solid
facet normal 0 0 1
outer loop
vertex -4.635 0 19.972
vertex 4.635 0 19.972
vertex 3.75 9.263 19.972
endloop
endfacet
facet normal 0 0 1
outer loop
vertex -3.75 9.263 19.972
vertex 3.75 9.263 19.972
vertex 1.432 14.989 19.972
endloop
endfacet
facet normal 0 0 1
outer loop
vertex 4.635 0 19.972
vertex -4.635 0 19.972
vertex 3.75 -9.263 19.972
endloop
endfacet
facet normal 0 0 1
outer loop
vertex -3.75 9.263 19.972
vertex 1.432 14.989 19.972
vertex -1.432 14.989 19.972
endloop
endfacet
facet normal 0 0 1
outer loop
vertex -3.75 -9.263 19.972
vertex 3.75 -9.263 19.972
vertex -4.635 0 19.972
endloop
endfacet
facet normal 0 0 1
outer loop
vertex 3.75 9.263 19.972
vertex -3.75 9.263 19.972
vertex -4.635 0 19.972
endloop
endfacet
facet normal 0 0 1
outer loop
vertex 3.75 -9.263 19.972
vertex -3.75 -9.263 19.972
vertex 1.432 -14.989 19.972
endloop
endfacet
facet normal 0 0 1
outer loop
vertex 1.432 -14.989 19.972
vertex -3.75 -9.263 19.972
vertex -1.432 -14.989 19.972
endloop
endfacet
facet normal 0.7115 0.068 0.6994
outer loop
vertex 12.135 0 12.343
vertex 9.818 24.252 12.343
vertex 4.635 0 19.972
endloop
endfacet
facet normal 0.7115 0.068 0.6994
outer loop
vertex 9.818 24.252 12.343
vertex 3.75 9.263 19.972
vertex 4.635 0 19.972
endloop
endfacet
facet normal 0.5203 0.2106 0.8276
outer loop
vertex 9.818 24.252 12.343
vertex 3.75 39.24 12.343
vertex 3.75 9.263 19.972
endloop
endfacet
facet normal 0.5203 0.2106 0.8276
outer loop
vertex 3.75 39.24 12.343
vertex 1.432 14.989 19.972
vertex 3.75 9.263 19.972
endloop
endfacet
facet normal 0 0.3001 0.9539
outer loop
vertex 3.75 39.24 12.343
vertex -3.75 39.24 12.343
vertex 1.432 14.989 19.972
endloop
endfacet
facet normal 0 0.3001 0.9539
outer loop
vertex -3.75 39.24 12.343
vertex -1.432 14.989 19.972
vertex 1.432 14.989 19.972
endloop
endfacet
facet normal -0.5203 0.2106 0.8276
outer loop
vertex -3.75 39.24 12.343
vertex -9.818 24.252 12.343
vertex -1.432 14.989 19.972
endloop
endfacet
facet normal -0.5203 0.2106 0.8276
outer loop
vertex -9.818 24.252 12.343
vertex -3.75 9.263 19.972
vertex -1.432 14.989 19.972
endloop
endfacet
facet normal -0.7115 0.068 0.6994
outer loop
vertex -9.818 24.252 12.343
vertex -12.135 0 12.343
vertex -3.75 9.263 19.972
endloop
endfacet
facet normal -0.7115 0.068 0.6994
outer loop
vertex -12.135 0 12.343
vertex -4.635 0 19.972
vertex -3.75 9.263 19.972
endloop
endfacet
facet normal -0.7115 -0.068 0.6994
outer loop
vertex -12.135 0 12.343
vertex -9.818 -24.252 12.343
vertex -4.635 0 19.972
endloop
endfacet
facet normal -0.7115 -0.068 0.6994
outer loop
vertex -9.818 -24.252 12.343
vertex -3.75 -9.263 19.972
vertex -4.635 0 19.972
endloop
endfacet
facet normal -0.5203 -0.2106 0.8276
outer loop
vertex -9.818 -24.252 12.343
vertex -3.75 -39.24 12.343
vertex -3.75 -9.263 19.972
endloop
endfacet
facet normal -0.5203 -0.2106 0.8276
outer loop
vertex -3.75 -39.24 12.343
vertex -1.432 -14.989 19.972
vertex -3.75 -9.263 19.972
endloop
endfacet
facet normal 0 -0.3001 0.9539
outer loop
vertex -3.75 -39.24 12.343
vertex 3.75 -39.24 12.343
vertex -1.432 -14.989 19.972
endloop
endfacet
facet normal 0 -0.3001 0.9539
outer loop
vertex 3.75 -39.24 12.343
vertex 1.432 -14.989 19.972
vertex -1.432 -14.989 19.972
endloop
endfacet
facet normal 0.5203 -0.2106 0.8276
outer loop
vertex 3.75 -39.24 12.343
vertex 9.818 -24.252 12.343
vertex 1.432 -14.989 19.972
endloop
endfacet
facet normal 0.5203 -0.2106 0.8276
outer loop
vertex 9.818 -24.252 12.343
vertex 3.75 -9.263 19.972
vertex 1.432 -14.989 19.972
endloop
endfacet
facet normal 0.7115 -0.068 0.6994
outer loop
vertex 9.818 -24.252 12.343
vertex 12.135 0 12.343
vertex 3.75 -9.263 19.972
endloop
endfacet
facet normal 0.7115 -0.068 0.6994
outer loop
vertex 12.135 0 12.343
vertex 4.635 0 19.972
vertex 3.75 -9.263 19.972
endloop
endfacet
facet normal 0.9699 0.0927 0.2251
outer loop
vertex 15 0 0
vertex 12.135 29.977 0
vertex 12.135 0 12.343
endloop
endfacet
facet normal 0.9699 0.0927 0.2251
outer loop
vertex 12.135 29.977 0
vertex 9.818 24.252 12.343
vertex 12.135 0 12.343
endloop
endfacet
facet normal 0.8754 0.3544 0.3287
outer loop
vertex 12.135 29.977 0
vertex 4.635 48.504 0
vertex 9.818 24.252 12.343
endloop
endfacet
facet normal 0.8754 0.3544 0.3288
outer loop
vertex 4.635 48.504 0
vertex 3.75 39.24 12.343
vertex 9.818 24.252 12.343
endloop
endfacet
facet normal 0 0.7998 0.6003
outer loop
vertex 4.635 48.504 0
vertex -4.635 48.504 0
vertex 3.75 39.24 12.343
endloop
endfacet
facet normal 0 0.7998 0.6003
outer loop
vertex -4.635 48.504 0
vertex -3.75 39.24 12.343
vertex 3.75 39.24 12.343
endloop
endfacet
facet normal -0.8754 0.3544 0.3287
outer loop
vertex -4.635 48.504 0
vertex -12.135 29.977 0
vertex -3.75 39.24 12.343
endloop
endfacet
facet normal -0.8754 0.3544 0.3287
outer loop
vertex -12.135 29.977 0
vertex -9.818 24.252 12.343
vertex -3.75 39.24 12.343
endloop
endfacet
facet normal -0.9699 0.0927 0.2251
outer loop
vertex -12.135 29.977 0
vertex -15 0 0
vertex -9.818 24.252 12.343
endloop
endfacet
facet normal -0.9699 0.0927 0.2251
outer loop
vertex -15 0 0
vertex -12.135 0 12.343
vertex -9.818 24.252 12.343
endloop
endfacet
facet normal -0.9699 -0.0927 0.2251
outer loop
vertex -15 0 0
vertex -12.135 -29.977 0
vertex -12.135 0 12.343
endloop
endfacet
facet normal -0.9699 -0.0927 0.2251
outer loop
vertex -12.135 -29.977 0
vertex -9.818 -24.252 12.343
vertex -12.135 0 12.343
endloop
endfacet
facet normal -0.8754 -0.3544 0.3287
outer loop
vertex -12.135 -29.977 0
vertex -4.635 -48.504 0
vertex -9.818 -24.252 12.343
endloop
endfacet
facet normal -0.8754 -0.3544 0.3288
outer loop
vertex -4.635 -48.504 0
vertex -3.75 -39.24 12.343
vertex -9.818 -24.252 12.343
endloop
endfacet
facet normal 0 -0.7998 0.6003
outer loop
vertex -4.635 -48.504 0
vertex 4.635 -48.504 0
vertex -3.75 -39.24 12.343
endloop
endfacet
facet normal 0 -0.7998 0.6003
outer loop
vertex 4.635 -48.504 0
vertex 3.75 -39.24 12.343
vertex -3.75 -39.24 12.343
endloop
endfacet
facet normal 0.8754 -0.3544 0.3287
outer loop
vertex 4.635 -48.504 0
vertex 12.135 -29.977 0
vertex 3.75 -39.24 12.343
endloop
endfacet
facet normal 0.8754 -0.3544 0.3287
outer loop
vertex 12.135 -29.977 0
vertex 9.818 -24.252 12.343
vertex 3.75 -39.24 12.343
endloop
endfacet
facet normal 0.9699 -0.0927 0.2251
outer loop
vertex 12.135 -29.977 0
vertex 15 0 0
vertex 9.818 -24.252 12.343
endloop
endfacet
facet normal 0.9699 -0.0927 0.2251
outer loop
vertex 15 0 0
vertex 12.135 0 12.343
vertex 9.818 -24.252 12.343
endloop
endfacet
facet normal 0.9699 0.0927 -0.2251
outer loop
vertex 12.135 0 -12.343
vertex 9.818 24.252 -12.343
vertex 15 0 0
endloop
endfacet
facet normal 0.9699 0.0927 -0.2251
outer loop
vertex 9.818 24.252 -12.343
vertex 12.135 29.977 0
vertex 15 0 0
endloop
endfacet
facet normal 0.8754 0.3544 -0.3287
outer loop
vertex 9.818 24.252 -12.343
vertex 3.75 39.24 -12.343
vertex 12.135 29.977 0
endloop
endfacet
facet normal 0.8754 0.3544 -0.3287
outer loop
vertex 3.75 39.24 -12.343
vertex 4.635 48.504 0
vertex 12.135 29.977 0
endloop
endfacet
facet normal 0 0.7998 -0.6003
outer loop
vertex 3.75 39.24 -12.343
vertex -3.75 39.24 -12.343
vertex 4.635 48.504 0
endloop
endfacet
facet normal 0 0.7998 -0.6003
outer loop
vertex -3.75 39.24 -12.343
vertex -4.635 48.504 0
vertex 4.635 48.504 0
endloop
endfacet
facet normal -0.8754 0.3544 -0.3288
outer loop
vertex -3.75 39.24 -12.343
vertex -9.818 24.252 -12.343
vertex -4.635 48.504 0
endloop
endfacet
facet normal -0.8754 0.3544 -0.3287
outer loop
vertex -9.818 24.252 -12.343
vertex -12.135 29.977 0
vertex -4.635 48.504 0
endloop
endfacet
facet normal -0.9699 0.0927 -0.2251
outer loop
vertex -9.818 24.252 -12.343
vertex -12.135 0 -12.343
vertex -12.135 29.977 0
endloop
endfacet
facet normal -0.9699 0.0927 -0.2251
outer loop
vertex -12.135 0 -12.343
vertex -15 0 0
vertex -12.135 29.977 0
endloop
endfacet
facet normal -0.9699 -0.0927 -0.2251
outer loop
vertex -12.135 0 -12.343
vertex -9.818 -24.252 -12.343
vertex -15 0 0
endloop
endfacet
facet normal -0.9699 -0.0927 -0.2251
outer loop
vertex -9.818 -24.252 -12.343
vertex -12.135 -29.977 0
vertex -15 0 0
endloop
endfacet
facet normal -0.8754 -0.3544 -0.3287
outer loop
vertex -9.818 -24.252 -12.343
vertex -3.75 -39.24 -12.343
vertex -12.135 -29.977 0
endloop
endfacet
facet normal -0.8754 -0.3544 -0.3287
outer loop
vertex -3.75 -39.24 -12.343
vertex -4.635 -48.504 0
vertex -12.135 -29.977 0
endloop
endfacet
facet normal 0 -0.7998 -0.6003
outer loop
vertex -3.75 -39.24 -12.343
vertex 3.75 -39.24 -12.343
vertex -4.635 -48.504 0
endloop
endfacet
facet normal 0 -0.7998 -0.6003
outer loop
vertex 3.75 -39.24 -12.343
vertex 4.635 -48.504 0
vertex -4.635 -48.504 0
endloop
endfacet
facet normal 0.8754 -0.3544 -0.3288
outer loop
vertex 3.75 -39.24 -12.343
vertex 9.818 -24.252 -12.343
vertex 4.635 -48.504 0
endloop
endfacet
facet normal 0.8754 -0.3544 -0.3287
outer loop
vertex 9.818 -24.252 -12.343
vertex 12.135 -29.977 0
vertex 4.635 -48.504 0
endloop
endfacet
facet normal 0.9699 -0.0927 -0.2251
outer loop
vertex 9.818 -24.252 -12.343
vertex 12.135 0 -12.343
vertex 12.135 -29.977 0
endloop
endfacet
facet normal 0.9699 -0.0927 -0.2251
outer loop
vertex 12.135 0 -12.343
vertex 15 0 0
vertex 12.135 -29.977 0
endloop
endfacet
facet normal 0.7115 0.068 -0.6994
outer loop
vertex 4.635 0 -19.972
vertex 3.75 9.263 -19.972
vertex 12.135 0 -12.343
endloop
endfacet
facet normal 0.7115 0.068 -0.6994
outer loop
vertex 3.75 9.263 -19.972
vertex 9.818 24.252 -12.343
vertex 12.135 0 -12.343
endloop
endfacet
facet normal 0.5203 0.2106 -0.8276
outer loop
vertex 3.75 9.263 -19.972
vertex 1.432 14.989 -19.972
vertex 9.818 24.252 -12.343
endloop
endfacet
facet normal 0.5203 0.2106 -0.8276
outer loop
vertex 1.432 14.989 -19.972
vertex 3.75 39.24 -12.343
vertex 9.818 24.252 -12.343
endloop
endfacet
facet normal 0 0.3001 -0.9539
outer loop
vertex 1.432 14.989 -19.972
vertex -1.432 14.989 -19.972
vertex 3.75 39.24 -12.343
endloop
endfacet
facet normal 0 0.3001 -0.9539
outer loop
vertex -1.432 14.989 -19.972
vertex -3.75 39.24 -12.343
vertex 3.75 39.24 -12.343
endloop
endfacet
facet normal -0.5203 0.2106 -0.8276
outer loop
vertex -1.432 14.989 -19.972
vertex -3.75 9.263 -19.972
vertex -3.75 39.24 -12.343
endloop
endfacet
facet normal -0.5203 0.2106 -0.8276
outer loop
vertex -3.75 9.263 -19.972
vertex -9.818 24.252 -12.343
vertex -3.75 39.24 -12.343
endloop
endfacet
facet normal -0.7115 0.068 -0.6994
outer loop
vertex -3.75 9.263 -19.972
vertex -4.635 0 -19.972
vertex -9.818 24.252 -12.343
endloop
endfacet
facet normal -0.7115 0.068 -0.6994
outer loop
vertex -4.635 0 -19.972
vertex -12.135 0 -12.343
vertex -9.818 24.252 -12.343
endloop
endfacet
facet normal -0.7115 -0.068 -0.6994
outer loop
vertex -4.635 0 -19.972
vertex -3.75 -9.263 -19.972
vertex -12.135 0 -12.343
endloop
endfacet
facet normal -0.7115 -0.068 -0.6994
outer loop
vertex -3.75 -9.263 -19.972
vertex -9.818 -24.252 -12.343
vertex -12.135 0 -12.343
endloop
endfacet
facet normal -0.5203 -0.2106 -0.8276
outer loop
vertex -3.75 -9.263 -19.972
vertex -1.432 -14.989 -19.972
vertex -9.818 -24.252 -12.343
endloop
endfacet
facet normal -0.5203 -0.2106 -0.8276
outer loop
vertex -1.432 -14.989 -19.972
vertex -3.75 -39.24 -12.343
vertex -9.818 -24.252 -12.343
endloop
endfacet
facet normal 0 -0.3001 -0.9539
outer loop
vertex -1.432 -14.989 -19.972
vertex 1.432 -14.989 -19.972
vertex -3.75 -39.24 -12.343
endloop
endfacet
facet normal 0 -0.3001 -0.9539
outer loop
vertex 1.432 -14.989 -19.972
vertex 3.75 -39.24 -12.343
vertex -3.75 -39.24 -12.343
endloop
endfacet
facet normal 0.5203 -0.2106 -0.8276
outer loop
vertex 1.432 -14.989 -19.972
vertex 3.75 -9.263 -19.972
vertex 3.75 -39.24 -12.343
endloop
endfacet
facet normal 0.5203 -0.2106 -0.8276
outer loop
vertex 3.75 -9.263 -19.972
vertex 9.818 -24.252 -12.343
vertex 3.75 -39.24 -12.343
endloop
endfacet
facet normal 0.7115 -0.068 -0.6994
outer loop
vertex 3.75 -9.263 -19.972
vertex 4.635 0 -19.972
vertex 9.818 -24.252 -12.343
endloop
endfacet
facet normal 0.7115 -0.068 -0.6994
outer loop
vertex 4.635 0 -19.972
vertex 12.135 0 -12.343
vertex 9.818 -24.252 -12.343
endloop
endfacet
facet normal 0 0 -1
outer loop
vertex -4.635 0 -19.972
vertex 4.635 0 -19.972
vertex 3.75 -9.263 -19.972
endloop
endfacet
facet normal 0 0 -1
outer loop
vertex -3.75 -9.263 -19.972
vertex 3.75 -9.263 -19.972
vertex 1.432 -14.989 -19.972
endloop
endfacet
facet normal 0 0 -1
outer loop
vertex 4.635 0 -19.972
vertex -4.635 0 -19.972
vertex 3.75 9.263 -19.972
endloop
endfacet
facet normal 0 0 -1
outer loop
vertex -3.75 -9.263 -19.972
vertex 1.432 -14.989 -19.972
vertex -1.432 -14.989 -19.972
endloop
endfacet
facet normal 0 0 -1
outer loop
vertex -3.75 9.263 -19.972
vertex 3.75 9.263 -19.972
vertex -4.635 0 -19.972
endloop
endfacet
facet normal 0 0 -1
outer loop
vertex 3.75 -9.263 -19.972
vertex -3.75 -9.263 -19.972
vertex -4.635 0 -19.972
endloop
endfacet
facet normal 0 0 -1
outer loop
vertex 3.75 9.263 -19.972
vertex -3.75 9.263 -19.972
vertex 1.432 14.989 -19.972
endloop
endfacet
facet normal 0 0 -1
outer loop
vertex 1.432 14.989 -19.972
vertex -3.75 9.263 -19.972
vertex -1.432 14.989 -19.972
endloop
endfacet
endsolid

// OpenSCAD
// Generated by SolidPython 1.0.1 on 2020-07-29 00:46:46


scale(v = [5, 17, 7]) {
	sphere(r = 3);
}
/***********************************************
*********      SolidPython code:      **********
************************************************
 
# import packages: SolidPython
from solid import *
from solid.utils import *
from itertools import chain, combinations, permutations


class Resize:

    def __init__(self, scad_file):
        self.scad_file = scad_file
        #self.scad_file = import_scad(scad_file)
        # cone/cylinder param:
        self.r1 = 0
        self.r2 = 0
        self.h = 0
        # rectangular prism param:
        self.w = 0
        self.l = 0
        # ellipse param:
        self.r = 0

    # import OpenScad code (file name corresponds to shape)


    # classify shape + parameters
    def assign(self, param1, param2, param3):
        if self.scad_file == 'cone.scad':
            self.r1 = param1
            self.r2 = param2
            self.h = param3
        elif self.scad_file == 'cylinder.scad':
            self.r1 = param1
            self.r2 = param2
            self.h = param3
        elif self.scad_file == 'rectangularPrism.scad':
            self.h = param1
            self.l = param2
            self.w = param3
        else:
            self.r = param1
            self.h = param2

    # resize parameters
    def iterate(self):
        x = range(3, 20, 2)
        i = 1
        if self.scad_file == 'cone.scad':
            tempList = list(permutations(x, 2))
            for temp in tempList:
                param1 = temp[0]
                param2 = temp[1]
                filepath = 'produced_scad_files/' + 'cone' + str(param1) + '_' + str(param2) + '_' + '.scad'
                scad_render_to_file(cylinder(h=param1, r1=param2, r2=0), filepath)

        elif self.scad_file == 'cylinder.scad':
            tempList = list(permutations(x, 3))
            for temp in tempList:
                param1 = temp[0]
                param2 = temp[1]
                filepath = 'produced_scad_files/' + 'cylinder' + str(param1) + '_' + str(param2) + '_' + '.scad'
                scad_render_to_file(cylinder(h=param1, r1=param2, r2=param2), filepath)

        elif self.scad_file == 'rectangularPrism.scad':
            tempList = list(permutations(x, 3))
            for temp in tempList:
                param1 = temp[0]
                param2 = temp[1]
                param3 = temp[2]
                filepath = 'produced_scad_files/' + 'rectangularPrism' + str(param1) + '_' + str(param2) + '_' + str(
                    param3) + '.scad'
                scad_render_to_file(cube(size=(param1, param2, param3)), filepath)

        elif self.scad_file == 'ellipse.scad':
            tempList = list(permutations(x, 4))
            for temp in tempList:
                param1 = temp[0]
                param2 = temp[1]
                param3 = temp[2]
                param4 = temp[3]
                filepath = 'produced_scad_files/' + 'ellipse' + str(param1) + '_' + str(param2) + '_' + str(param3) + '_' + str(param4) + '.scad'
                scad_render_to_file(scale([param1, param2, param3])(sphere(r=param4)), filepath)

    def render_to_scadfile(self):
        scad_render_to_file(scad, 'example.scad') 
 
************************************************/
